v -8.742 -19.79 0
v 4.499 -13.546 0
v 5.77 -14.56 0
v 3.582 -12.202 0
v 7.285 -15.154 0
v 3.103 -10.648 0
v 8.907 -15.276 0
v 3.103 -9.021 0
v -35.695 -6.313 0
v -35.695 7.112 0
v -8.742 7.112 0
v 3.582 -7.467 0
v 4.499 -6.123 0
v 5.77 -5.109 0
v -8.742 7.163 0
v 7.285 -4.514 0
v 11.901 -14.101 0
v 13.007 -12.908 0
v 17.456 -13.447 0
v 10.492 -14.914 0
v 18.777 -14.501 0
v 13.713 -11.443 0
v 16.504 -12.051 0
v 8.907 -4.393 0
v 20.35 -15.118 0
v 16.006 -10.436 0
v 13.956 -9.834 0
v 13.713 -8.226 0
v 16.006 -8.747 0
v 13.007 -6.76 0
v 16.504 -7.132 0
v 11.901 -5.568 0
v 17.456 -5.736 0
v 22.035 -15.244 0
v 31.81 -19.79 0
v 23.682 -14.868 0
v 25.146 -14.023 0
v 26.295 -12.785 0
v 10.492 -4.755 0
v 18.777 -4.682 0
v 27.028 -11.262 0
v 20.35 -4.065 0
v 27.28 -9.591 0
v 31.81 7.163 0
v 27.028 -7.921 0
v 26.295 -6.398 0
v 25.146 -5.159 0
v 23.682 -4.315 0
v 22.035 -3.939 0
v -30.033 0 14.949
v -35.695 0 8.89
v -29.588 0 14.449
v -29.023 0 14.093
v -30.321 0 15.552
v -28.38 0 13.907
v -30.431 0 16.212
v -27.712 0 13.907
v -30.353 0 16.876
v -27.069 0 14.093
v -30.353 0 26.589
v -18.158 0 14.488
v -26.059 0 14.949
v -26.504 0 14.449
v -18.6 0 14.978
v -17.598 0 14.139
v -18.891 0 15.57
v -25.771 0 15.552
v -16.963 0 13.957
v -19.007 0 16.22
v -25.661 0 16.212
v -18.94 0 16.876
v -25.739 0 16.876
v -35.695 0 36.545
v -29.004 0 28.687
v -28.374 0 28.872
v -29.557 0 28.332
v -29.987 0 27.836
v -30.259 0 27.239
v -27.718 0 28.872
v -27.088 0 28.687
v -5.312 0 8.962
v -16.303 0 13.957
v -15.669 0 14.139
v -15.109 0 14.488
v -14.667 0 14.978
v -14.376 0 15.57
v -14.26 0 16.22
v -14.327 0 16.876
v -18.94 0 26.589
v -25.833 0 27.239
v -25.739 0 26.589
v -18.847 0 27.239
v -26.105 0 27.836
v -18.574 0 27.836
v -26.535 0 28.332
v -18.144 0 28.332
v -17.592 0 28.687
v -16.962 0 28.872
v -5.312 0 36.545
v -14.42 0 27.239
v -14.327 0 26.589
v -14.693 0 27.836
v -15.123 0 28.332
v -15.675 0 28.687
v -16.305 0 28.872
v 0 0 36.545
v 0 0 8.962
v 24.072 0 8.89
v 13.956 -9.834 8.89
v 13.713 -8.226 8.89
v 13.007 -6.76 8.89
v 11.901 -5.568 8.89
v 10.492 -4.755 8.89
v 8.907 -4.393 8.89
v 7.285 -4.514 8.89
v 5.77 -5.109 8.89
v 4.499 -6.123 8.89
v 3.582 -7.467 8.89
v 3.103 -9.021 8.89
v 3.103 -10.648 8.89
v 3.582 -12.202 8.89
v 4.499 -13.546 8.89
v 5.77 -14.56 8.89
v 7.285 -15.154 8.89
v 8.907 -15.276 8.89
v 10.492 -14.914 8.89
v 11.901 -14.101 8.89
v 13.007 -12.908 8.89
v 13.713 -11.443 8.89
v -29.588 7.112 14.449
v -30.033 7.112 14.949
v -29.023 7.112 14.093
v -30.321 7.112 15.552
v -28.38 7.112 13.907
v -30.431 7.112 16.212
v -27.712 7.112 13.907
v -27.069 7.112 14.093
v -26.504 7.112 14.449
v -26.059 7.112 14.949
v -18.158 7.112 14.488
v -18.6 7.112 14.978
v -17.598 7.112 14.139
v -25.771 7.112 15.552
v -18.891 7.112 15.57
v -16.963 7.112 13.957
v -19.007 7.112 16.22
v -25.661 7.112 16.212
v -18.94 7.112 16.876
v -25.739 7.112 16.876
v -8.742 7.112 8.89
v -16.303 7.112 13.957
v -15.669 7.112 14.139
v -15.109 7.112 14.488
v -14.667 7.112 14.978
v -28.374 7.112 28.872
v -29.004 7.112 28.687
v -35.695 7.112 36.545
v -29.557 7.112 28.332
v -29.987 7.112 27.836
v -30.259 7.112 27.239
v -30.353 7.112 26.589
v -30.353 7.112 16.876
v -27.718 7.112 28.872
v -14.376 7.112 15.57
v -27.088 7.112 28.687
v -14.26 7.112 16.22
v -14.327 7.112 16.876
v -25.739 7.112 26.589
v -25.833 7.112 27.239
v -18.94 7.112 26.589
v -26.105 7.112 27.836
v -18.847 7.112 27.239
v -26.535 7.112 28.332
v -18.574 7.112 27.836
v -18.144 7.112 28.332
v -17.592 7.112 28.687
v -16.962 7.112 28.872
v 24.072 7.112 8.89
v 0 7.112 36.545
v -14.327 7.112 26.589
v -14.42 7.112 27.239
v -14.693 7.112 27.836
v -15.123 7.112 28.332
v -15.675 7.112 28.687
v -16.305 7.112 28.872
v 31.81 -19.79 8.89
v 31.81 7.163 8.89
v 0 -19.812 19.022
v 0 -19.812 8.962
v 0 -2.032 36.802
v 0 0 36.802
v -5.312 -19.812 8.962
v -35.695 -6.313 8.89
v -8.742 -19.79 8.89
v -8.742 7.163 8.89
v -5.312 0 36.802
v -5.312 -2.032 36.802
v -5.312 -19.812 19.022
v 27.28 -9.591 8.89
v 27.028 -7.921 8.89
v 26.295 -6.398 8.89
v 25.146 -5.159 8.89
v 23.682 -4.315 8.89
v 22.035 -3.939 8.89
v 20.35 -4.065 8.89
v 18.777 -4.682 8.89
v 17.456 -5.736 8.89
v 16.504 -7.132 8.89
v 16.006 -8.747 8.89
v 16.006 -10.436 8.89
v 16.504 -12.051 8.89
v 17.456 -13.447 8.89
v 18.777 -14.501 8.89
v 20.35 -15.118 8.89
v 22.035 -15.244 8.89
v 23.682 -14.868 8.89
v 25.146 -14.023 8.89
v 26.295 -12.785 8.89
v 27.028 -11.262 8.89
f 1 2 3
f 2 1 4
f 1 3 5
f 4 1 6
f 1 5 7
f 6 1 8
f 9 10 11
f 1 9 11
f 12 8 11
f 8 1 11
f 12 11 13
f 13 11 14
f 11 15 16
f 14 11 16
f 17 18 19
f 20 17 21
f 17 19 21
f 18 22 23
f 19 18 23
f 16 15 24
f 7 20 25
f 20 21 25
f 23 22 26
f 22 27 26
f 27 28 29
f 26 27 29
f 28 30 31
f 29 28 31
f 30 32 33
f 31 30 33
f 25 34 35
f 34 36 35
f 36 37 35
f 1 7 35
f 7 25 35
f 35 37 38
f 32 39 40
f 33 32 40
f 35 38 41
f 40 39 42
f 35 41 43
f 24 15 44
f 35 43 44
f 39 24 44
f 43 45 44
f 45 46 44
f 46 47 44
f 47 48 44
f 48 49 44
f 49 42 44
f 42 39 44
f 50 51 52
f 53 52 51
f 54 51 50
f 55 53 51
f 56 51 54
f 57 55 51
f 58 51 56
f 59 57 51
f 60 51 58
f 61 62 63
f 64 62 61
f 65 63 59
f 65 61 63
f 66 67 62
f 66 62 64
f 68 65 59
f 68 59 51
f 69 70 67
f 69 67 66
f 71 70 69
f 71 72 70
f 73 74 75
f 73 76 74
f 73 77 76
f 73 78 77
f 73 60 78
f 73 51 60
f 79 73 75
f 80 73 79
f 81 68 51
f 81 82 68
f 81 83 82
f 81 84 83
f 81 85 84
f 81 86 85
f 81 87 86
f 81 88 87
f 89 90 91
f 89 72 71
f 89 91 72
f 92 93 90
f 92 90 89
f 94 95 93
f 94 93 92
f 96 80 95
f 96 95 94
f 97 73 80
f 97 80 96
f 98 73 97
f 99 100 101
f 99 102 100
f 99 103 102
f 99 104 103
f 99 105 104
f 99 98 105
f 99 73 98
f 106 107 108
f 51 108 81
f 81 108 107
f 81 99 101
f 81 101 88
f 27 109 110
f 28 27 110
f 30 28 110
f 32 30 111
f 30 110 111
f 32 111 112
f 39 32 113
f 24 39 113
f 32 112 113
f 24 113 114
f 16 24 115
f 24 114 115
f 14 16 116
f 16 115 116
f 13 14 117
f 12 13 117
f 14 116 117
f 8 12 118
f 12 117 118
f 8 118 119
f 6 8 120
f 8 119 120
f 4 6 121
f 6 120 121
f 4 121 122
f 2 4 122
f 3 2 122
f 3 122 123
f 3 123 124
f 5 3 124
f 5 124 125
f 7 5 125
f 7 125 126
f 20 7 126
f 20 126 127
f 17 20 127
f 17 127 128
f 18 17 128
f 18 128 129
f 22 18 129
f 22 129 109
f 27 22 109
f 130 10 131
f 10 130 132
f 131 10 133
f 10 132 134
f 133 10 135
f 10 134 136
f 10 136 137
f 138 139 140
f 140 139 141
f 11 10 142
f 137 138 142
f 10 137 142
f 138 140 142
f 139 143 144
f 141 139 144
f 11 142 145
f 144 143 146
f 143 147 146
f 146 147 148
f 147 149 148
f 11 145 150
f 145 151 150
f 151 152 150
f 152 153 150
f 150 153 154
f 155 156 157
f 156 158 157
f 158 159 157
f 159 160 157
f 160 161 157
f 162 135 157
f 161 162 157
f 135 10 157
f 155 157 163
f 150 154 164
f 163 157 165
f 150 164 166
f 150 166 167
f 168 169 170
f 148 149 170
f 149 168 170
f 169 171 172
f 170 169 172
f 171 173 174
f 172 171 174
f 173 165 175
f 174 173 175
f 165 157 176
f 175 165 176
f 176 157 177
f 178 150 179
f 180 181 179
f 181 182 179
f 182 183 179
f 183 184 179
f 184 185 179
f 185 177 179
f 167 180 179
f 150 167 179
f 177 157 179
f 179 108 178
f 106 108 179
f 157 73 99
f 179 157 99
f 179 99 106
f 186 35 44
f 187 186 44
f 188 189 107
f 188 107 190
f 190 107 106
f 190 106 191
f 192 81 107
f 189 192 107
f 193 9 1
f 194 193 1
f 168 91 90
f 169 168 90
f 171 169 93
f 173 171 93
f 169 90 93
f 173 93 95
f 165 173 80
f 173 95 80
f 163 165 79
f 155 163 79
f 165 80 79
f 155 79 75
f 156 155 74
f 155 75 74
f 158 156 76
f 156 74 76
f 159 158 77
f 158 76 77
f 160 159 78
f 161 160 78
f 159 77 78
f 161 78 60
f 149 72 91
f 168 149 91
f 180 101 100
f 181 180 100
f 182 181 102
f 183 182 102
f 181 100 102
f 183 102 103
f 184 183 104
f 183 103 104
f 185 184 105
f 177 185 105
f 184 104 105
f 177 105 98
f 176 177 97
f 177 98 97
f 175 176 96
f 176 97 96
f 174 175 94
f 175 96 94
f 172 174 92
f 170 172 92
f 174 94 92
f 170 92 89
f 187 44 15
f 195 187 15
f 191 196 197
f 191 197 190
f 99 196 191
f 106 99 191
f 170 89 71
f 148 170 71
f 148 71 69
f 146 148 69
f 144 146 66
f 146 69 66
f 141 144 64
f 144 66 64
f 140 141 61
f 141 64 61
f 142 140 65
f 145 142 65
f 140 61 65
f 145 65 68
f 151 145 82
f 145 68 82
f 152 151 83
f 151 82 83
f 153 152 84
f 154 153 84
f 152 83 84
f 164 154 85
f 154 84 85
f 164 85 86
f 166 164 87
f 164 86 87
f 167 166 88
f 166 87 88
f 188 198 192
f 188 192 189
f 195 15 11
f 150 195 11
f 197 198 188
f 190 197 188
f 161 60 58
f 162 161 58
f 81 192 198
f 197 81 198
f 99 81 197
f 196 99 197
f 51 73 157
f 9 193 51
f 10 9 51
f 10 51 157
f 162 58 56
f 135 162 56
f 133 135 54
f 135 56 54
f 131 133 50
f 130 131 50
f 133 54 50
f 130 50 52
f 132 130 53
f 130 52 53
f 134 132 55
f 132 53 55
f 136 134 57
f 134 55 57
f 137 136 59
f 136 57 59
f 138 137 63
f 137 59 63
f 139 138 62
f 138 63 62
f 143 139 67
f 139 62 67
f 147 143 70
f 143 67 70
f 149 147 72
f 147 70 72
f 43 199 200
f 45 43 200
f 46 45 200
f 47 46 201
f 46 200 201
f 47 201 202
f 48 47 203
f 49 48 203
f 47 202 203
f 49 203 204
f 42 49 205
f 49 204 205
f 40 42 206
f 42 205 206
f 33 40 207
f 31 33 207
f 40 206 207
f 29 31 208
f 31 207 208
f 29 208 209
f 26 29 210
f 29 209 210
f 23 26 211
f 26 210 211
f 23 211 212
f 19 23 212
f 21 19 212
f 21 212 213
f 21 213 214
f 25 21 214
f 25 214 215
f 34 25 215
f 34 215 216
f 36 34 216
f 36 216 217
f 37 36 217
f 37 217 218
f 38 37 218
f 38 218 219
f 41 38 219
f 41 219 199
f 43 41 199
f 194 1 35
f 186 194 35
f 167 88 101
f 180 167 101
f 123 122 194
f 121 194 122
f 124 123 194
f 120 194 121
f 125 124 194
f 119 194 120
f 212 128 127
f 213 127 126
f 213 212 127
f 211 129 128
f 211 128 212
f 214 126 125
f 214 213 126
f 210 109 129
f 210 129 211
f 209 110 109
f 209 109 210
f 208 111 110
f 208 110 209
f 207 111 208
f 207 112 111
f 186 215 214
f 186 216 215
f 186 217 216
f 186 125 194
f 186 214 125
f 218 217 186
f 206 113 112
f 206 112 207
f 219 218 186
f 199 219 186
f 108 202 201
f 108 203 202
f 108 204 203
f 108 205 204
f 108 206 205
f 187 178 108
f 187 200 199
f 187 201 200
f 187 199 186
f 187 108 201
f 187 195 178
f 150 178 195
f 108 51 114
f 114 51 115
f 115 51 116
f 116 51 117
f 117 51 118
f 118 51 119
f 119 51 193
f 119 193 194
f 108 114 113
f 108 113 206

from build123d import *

# Parameters (mm, degrees)
F0_W      = 35.6949009001
F0_H      = 36.5447811782
F1_DEPTH  = 7.112
F2_W      = 26.9532920793
F2_H      = 13.2338248659
F3_DEPTH  = 8.89
F4_W      = 5.3117033094
F4_H      = 27.8393924236
F5_DEPTH  = 19.812
F6_SIZE   = 17.78
F8_DEPTH  = 25.4
F9_R      = 5.4567571196
F9_R_2    = 5.6687450147
F10_DEPTH = 25.4


with BuildPart() as f1:
    # F0 (on Front) → F1 (new body)
    with BuildSketch(Plane.XZ):
        with Locations((-17.8474504501, 18.2723905891)):
            Rectangle(F0_W, F0_H)
        Polygon((0, 36.5447811782), (0, 0), (31.8097434938, 0), align=None)
    extrude(amount=-F1_DEPTH)

    # F2 (on Top) → F3 (join)
    with BuildSketch(Plane.XY):
        Polygon((31.8097434938, 7.1632624604), (-8.7416088209, 7.1632624604), (-8.7416088209, 6.9204405881), (-8.7416088209, -6.3133842777), (-8.7416088209, -19.7900310159), (31.8097434938, -19.7900310159), align=None)
        with Locations((-22.2182548605, 0.3035281552)):
            Rectangle(F2_W, F2_H)
        Polygon((-8.7416088209, -19.7900310159), (-8.7416088209, -6.3133842777), (-35.6949009001, -6.3133842777), align=None)
    extrude(amount=F3_DEPTH)

    # F4 (on Front) → F5 (join)
    with BuildSketch(Plane.XZ):
        with Locations((-2.6558516547, 22.8818580508)):
            Rectangle(F4_W, F4_H)
    extrude(amount=F5_DEPTH)

    # F6
    f6_edges = [f1.edges().sort_by_distance(p)[0] for p in [
        (-2.655852, -19.812, 36.801554),
    ]]
    chamfer(f6_edges, length=F6_SIZE)

    # F7 (on Front) → F8 (cut)
    with BuildSketch(Plane.XZ):
        with BuildLine():
            ThreePointArc((-25.7391817868, 26.5890602022), (-28.0459942296, 28.8958726451), (-30.3528066725, 26.5890602022))
            Line((-30.3528066725, 26.5890602022), (-30.3528066725, 16.8761610985))
            ThreePointArc((-30.3528066725, 16.8761610985), (-28.0459942296, 13.8837524755), (-25.7391817868, 16.8761610985))
            Line((-25.7391817868, 16.8761610985), (-25.7391817868, 26.5890602022))
        make_face()
        with BuildLine():
            Line((-18.9401526004, 26.5890602022), (-18.9401526004, 16.8761610985))
            ThreePointArc((-18.9401526004, 16.8761610985), (-16.6333387606, 13.93419969), (-14.3265249208, 16.8761610985))
            Line((-14.3265249208, 16.8761610985), (-14.3265249208, 26.5890602022))
            ThreePointArc((-14.3265249208, 26.5890602022), (-16.6333387606, 28.8958740421), (-18.9401526004, 26.5890602022))
        make_face()
    extrude(amount=-F8_DEPTH, mode=Mode.SUBTRACT)

    # F9 (on face) → F10 (cut)
    with BuildSketch(Plane.XY.offset(8.89)):
        with Locations((8.4987860173, -9.8343091086)):
            Circle(F9_R)
        with Locations((21.6111987829, -9.5914872363)):
            Circle(F9_R_2)
    extrude(amount=-F10_DEPTH, mode=Mode.SUBTRACT)


solid = f1.part
